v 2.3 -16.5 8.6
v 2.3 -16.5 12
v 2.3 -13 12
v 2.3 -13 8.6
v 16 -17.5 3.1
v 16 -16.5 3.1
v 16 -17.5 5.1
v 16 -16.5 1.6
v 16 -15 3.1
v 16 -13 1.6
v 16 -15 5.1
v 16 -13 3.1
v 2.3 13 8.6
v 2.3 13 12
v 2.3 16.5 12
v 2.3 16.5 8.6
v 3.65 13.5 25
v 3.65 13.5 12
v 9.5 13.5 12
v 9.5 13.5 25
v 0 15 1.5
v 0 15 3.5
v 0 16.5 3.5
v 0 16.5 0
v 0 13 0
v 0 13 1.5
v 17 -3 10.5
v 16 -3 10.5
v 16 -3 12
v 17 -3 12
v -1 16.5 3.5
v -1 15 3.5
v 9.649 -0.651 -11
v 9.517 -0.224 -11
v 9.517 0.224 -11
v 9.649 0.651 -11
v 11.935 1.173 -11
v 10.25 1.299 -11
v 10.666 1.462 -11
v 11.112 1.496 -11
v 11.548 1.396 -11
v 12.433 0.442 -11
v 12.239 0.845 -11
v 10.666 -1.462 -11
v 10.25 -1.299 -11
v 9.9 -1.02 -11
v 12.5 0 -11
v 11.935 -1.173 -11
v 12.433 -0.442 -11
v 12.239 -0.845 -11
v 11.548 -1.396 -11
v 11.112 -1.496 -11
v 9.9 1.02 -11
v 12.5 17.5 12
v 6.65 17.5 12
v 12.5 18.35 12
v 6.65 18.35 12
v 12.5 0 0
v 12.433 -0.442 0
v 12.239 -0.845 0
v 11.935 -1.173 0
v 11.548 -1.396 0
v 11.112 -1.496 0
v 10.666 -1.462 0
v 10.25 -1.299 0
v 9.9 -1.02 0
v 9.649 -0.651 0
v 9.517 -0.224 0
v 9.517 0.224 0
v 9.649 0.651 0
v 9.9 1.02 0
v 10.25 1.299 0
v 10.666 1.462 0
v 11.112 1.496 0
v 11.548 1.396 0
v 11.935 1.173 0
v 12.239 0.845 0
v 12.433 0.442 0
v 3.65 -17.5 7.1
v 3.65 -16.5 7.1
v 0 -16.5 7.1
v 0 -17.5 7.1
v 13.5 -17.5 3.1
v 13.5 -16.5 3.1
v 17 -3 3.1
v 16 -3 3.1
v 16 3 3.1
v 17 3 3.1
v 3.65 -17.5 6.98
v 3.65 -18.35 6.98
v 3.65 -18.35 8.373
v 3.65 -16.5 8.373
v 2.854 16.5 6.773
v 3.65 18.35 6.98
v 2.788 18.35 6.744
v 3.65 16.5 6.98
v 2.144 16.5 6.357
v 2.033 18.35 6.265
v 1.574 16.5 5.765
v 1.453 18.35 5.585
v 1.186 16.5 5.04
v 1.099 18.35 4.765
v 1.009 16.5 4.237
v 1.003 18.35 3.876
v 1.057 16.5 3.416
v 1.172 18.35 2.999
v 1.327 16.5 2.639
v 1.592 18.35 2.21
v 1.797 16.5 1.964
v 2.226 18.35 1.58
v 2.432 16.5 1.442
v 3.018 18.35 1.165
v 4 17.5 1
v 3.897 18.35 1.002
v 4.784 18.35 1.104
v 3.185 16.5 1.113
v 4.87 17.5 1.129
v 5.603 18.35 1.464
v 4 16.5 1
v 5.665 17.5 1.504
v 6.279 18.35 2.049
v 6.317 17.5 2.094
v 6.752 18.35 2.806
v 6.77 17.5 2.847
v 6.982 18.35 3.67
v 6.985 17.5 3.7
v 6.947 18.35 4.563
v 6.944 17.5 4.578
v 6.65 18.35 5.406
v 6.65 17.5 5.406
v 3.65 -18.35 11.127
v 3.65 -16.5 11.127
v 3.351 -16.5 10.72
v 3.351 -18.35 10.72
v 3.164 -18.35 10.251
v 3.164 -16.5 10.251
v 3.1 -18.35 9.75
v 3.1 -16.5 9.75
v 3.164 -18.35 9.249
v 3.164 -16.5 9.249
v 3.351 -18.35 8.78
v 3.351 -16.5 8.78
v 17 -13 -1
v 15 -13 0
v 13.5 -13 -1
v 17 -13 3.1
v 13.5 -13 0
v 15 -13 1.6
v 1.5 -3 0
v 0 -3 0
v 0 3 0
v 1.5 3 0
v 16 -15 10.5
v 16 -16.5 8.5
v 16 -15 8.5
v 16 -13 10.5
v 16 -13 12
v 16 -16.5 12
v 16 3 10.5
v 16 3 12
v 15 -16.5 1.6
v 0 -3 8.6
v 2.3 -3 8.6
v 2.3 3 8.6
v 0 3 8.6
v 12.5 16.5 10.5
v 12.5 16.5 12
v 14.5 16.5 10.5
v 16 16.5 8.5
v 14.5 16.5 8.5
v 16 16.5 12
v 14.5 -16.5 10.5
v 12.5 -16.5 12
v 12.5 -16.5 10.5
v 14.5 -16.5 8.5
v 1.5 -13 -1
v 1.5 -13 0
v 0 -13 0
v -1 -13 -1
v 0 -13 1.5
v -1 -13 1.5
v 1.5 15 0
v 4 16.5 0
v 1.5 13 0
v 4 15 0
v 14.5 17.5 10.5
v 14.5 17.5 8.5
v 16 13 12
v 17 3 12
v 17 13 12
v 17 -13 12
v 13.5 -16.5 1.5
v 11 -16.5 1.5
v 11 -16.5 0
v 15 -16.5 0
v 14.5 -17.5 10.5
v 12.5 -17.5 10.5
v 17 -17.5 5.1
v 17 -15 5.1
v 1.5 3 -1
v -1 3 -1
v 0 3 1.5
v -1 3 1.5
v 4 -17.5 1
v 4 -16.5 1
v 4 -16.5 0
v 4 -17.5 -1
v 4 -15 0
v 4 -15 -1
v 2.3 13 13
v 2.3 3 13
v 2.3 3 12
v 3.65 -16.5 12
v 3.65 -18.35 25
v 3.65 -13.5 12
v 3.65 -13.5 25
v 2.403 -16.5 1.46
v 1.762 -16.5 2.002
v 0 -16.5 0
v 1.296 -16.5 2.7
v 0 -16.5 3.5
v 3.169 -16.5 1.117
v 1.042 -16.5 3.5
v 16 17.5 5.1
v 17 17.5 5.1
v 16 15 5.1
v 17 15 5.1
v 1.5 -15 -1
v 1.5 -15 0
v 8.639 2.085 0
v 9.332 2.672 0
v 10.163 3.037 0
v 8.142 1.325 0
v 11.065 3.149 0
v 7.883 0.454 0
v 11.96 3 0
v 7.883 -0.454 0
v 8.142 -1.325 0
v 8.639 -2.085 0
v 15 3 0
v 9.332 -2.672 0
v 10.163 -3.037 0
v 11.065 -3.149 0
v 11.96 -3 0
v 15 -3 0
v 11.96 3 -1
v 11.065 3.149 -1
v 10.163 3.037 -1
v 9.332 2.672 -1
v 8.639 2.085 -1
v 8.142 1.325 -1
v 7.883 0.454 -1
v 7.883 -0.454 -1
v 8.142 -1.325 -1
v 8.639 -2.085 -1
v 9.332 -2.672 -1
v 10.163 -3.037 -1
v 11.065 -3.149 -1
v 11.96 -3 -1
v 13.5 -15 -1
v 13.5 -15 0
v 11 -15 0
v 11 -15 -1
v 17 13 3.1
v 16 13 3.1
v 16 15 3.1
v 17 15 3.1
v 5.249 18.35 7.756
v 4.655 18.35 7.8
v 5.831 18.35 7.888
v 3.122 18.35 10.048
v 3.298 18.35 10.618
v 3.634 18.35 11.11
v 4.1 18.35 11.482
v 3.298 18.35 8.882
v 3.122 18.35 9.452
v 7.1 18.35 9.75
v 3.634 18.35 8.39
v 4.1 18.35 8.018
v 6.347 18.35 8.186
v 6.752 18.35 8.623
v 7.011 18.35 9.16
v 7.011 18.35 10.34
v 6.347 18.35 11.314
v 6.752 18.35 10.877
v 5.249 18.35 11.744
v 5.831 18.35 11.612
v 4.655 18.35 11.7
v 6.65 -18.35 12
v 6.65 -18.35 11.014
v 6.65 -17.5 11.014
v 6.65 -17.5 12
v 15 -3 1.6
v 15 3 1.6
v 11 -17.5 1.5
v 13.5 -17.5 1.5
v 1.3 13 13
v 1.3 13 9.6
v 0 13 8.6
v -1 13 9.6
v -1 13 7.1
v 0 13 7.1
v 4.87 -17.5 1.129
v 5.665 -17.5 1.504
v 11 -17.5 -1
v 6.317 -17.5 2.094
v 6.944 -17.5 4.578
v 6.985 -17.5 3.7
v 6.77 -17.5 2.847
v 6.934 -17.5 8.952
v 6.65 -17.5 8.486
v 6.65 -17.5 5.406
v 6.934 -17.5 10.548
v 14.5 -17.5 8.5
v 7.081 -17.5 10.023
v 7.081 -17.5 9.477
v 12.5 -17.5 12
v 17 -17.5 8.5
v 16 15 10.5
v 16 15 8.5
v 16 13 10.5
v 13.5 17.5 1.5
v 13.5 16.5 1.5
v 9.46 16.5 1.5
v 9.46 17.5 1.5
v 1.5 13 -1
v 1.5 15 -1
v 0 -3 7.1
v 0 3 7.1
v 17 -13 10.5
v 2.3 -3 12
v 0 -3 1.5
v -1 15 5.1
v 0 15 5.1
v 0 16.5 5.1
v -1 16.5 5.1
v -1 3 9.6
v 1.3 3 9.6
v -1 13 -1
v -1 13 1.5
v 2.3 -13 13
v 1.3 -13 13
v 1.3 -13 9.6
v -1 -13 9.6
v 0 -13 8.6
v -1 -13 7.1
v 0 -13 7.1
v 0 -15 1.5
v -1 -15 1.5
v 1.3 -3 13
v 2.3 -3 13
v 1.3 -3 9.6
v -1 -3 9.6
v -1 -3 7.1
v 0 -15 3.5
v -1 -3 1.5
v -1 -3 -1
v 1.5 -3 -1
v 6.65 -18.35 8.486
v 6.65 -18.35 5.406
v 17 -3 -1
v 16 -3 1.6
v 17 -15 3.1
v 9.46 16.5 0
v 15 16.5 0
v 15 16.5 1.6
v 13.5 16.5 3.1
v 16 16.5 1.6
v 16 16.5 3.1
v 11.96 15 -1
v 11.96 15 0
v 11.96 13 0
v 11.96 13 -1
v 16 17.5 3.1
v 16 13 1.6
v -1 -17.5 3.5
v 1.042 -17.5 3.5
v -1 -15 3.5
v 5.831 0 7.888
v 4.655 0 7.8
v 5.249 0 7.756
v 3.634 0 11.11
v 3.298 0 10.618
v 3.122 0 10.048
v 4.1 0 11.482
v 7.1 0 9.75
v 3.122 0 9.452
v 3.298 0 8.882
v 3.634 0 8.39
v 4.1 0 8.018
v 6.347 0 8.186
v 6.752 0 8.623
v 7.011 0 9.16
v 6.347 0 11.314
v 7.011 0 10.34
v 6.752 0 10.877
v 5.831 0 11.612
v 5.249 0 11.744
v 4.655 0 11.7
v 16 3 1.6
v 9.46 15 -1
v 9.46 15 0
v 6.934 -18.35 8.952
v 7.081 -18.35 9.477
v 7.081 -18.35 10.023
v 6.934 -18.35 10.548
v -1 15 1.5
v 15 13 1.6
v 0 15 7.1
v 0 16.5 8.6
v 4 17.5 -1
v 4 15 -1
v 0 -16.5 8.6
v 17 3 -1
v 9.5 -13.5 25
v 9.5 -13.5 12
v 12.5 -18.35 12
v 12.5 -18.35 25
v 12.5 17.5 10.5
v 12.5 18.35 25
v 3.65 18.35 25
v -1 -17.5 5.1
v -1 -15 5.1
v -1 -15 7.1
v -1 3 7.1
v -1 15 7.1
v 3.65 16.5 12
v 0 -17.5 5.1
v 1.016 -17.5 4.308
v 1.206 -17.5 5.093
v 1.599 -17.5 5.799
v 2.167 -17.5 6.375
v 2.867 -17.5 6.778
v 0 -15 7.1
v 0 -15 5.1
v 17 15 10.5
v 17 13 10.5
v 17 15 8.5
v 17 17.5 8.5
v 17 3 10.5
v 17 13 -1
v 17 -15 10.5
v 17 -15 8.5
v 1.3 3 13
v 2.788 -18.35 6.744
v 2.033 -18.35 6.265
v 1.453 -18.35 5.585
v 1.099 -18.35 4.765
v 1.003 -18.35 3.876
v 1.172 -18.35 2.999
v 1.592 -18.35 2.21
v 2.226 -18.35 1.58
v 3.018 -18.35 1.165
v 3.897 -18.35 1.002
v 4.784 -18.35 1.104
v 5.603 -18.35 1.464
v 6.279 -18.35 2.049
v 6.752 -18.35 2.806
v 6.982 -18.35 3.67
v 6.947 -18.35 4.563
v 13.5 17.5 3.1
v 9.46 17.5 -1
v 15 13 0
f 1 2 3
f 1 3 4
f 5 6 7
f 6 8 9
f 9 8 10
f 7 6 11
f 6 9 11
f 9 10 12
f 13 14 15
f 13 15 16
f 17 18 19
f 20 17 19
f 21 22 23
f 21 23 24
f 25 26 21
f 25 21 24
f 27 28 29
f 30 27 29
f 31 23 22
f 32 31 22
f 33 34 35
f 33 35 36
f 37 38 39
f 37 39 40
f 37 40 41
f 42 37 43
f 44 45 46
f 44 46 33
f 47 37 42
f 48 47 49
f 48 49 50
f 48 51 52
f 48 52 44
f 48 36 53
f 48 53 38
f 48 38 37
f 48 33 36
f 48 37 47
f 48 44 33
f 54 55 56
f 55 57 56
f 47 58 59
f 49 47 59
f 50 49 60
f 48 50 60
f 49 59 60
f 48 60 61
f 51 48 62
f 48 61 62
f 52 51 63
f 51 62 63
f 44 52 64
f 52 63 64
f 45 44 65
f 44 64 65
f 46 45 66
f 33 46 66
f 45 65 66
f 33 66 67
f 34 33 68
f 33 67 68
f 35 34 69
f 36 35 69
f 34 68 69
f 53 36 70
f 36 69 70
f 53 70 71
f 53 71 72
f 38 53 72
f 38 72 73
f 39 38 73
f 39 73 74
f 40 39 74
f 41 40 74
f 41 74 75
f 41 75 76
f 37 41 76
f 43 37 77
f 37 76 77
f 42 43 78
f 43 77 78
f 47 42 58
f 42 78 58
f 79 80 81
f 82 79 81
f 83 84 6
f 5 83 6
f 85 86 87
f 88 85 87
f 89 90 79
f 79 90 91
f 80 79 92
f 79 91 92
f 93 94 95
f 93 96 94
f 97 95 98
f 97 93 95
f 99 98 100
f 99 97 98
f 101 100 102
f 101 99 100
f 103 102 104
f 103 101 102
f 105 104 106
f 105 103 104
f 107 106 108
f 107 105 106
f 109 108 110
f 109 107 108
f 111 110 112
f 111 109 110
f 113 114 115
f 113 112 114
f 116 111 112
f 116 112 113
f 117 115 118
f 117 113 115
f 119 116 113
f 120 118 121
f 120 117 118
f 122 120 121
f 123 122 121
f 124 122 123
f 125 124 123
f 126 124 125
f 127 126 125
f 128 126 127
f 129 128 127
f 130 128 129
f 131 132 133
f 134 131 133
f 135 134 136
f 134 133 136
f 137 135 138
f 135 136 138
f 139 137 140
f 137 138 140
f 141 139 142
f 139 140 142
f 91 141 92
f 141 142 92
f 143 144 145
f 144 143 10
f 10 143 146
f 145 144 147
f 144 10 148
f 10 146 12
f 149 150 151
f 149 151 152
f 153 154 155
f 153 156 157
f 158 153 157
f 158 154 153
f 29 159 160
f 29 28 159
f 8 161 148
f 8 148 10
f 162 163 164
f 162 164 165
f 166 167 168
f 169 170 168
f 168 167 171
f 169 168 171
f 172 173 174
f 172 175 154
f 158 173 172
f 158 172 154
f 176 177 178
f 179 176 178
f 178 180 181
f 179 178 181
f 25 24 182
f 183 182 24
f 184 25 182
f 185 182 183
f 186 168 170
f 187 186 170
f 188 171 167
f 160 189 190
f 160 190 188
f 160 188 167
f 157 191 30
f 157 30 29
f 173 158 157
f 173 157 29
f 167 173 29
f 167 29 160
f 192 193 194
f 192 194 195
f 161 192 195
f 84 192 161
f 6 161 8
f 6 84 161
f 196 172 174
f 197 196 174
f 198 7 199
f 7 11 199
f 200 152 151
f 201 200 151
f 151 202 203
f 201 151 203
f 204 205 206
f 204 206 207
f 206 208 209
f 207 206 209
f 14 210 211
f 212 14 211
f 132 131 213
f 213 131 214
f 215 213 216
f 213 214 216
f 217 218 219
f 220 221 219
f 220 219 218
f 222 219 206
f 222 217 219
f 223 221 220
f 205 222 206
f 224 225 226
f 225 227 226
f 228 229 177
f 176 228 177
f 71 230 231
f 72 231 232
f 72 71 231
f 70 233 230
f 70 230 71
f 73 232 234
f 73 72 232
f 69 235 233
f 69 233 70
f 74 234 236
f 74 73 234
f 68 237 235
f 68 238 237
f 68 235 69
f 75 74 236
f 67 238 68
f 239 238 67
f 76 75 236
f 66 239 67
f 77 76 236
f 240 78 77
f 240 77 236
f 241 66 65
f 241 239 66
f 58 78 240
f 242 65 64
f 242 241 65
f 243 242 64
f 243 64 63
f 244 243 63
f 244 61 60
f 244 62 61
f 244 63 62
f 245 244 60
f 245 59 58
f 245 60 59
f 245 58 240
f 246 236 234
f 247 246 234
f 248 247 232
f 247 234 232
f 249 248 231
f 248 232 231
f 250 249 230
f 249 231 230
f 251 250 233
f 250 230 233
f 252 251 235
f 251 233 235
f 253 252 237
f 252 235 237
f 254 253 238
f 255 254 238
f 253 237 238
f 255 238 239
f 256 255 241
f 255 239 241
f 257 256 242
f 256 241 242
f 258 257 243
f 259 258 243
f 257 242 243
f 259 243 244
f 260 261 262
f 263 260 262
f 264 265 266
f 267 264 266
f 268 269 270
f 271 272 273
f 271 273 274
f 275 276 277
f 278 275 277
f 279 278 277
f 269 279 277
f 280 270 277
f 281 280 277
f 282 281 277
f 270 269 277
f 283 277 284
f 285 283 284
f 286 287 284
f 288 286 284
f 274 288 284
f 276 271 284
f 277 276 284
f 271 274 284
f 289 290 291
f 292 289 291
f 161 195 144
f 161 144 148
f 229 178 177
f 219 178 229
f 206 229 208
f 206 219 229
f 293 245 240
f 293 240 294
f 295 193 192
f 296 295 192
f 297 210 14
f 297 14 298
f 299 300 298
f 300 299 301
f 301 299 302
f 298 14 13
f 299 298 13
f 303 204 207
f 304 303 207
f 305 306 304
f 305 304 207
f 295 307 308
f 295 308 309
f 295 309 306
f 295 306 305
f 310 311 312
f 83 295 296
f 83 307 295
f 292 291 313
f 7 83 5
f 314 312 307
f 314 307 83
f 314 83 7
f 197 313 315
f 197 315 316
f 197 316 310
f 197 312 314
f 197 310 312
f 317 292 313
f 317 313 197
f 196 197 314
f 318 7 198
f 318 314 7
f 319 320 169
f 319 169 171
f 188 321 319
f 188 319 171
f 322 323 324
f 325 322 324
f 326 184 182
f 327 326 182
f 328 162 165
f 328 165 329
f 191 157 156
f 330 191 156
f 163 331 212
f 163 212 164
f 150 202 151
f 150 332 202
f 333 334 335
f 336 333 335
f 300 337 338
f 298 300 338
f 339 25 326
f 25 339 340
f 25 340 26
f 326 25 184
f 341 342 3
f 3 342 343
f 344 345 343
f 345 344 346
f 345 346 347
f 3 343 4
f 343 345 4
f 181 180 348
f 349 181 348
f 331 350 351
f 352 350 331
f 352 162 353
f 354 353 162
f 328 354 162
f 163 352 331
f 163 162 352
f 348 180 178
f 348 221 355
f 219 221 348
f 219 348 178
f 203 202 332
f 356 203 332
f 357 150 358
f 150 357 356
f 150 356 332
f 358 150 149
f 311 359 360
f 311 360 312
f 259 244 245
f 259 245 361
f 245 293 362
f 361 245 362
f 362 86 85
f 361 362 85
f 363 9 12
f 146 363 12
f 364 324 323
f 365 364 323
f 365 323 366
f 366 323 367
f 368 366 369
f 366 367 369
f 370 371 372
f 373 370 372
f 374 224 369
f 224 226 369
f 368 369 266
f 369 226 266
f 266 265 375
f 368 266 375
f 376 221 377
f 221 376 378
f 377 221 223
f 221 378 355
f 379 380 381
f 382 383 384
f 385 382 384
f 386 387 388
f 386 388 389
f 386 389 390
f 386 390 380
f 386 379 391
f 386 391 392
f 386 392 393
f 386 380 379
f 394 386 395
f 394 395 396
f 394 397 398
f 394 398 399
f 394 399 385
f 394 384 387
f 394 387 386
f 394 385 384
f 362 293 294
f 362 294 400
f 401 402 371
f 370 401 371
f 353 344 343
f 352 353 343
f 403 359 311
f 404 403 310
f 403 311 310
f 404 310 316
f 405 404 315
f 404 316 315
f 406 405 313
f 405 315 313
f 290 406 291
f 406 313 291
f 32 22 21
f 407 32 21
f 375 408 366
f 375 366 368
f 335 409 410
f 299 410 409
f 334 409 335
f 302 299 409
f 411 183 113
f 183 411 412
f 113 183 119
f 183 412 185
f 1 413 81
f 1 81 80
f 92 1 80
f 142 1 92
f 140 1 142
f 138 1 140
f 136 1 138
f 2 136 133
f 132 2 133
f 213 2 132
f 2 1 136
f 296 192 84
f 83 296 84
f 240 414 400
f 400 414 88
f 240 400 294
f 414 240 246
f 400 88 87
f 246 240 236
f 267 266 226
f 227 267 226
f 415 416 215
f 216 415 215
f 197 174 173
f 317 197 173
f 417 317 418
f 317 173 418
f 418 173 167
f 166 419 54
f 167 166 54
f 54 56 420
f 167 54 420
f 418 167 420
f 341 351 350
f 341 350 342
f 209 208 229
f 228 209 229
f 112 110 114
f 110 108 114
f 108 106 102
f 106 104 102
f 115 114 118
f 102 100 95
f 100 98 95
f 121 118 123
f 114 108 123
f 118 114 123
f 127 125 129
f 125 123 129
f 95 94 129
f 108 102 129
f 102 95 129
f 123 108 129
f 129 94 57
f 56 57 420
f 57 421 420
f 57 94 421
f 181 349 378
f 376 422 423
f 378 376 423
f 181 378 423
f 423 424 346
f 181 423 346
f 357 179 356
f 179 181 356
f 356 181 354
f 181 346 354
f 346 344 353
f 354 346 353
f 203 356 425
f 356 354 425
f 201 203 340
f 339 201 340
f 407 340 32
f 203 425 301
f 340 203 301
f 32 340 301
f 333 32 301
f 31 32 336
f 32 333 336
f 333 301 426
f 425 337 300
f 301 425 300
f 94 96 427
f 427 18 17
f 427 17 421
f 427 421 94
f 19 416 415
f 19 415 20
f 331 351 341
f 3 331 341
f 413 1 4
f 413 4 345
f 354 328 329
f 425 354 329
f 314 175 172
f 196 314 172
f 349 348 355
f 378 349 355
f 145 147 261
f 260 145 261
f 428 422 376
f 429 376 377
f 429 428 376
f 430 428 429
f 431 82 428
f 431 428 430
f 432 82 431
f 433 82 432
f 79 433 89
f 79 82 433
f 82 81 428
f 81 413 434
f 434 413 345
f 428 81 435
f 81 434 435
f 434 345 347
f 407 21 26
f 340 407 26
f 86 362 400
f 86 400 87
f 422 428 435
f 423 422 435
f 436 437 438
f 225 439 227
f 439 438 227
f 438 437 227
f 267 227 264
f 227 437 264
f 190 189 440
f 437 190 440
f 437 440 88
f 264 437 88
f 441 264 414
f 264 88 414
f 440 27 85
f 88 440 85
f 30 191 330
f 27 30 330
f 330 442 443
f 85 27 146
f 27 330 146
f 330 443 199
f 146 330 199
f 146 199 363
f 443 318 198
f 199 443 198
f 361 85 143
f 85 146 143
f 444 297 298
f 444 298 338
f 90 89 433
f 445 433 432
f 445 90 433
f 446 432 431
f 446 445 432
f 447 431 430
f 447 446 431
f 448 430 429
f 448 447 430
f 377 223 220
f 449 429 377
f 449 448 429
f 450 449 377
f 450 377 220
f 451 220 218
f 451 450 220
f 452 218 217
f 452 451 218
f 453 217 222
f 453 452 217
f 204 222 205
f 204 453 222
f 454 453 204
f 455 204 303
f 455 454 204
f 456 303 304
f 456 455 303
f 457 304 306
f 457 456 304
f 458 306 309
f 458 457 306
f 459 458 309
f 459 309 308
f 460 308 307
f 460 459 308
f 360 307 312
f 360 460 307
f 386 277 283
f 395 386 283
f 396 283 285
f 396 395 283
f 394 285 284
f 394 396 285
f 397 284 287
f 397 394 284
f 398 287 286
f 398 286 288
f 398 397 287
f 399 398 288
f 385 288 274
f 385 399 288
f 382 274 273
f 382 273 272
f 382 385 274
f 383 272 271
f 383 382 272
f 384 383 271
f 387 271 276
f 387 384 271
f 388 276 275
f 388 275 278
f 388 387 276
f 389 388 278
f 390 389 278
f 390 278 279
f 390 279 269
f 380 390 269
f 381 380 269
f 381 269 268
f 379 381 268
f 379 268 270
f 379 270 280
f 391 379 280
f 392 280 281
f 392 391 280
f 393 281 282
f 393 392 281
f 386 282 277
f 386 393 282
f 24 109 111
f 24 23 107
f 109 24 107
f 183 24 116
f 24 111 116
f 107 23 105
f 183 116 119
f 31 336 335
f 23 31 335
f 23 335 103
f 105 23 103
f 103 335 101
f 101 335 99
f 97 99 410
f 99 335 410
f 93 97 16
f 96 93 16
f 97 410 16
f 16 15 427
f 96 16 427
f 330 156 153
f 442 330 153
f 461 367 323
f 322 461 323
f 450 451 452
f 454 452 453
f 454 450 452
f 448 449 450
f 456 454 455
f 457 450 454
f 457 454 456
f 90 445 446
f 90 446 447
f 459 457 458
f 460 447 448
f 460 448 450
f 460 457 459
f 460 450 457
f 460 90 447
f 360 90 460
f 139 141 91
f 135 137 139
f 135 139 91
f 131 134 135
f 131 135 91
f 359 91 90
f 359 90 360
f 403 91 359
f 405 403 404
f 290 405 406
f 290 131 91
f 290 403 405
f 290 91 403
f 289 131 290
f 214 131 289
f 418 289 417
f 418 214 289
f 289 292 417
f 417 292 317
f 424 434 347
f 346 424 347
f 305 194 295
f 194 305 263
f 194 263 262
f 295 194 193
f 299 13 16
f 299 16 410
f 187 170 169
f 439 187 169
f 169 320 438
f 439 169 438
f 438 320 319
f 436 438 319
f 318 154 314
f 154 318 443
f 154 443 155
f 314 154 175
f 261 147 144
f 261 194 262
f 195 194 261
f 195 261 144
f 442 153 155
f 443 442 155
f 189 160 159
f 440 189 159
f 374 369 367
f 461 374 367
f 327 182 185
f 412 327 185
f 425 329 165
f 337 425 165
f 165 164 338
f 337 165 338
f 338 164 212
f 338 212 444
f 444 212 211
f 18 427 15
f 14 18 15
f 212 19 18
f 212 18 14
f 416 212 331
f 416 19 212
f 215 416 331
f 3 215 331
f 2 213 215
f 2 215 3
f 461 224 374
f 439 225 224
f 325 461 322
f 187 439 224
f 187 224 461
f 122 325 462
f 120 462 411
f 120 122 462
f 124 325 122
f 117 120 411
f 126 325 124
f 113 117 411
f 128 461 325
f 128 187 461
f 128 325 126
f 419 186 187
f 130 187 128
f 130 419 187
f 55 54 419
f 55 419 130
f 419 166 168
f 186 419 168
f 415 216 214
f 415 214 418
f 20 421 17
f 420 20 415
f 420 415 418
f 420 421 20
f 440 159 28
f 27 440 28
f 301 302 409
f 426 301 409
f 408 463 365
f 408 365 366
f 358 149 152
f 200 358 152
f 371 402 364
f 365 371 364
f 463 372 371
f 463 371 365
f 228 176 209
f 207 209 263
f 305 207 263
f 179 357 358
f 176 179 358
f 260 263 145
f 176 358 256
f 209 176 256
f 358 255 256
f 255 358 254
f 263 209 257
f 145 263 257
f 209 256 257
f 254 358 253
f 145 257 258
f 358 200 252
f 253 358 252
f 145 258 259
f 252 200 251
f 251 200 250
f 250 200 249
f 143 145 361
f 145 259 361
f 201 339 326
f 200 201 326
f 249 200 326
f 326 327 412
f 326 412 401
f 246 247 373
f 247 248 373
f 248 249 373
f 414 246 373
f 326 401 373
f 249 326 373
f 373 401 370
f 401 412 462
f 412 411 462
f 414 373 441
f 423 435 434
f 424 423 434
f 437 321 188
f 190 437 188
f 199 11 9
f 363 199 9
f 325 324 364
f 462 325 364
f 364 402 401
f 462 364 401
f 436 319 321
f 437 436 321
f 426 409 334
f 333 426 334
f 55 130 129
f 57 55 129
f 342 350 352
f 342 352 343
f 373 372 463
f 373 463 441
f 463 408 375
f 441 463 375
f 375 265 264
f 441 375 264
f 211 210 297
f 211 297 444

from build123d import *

# Parameters (mm, degrees)
F0_R          = 3
F0_R_2        = 2
F1_DEPTH      = 16.5
F1_DEPTH_BACK = 16.5
F3_DEPTH      = 18.35
F4_DEPTH      = 11
F5_DEPTH      = 18.35
F6_DEPTH      = 18.35
F7_START      = -12
F2_W          = 3
F2_H          = 1.85
F7_DEPTH      = 13
F9_DEPTH      = 1
F11_DEPTH     = 1
F12_W         = 3
F12_H         = 1.85
F12_W_2       = 2.85
F12_W_3       = 4.2
F12_H_2       = 1.5
F13_DEPTH     = 13
F14_DEPTH     = 13
F15_DEPTH     = 8
F16_DEPTH     = 8
F17_W         = 3.3
F17_H         = 10
F18_DEPTH     = 1
F19_W         = 10
F19_H         = 4.4
F20_DEPTH     = 1
F22_DEPTH     = 1.6
F24_DEPTH     = 1
F26_DEPTH     = 1
F28_DEPTH     = 1


with BuildPart() as f1:
    # F0 (on Front) → F1 (new body, two sides)
    with BuildSketch(Plane.XZ) as f1_sk:
        Polygon((0, 8.6), (0, 0), (15, 0), (15, 1.6), (16, 1.6), (16, 12), (2.3, 12), (2.3, 8.6), align=None)
        with Locations((4, 4)):
            Circle(F0_R, mode=Mode.SUBTRACT)
        with Locations((5.1, 9.75)):
            Circle(F0_R_2, mode=Mode.SUBTRACT)
        with Locations((4, 4)):
            Circle(F0_R)
        with Locations((5.1, 9.75)):
            Circle(F0_R_2)
    extrude(amount=F1_DEPTH)
    extrude(f1_sk.sketch, amount=-F1_DEPTH_BACK)

    # F0 (on Front) → F3 (join, symmetric)
    with BuildSketch(Plane.XZ):
        with Locations((4, 4)):
            Circle(F0_R)
    extrude(amount=F3_DEPTH, both=True)

    # F2 (on face) → F4 (join)
    with BuildSketch(Plane(origin=(0, 0, 0), x_dir=(1, 0, 0), z_dir=(0, 0, -1))):
        with BuildLine():
            ThreePointArc((9.5, 0), (11, -1.5), (12.5, 0))
            ThreePointArc((12.5, 0), (11, 1.5), (9.5, 0))
        make_face()
    extrude(amount=F4_DEPTH)

    # F0 (on Front) → F5 (join)
    with BuildSketch(Plane.XZ):
        with Locations((5.1, 9.75)):
            Circle(F0_R_2)
    extrude(amount=F5_DEPTH)

    # F2 (on face) → F7 (join)
    with BuildSketch(Plane(origin=(0, 0, 0), x_dir=(1, 0, 0), z_dir=(0, 0, -1)).offset(F7_START)):
        with Locations((11, 17.425)):
            Rectangle(F2_W, F2_H)
        with BuildLine():
            ThreePointArc((9.5, 2), (11, 2.5), (12.5, 2))
            Line((12.5, 2), (12.5, 16.5))
            Line((12.5, 16.5), (9.5, 16.5))
            Line((9.5, 16.5), (9.5, 2))
        make_face()
        with BuildLine():
            Line((12.5, 0), (12.5, 2))
            ThreePointArc((12.5, 2), (11, 2.5), (9.5, 2))
            Line((9.5, 2), (9.5, 0))
            ThreePointArc((9.5, 0), (11, 1.5), (12.5, 0))
        make_face()
        with BuildLine():
            ThreePointArc((9.5, 0), (11, -1.5), (12.5, 0))
            ThreePointArc((12.5, 0), (11, 1.5), (9.5, 0))
        make_face()
        with BuildLine():
            ThreePointArc((9.5, -2), (11, -2.5), (12.5, -2))
            Line((12.5, -2), (12.5, 0))
            ThreePointArc((12.5, 0), (11, -1.5), (9.5, 0))
            Line((9.5, 0), (9.5, -2))
        make_face()
        with BuildLine():
            Line((12.5, -16.5), (12.5, -2))
            ThreePointArc((12.5, -2), (11, -2.5), (9.5, -2))
            Line((9.5, -2), (9.5, -16.5))
            Line((9.5, -16.5), (12.5, -16.5))
        make_face()
        with Locations((11, -17.425)):
            Rectangle(F2_W, F2_H)
    extrude(amount=-F7_DEPTH)

    # F8 (on face) → F9 (join)
    with BuildSketch(Plane.YZ.offset(16)):
        Polygon((-13, 3.1), (-13, 1.6), (-3, 1.6), (-3, 3.1), (3, 3.1), (3, 1.6), (13, 1.6), (13, 3.1), (15, 3.1), (15, 5.1), (16.5, 5.1), (16.5, 8.5), (15, 8.5), (15, 10.5), (13, 10.5), (13, 12), (3, 12), (3, 10.5), (-3, 10.5), (-3, 12), (-13, 12), (-13, 10.5), (-15, 10.5), (-15, 8.5), (-16.5, 8.5), (-16.5, 5.1), (-15, 5.1), (-15, 3.1), align=None)
    extrude(amount=F9_DEPTH)

    # F10 (on face) → F11 (join)
    with BuildSketch(Plane(origin=(0, 0, 0), x_dir=(0, -1, 0), z_dir=(-1, 0, 0))):
        Polygon((-13, 1.5), (-13, 0), (-3, 0), (-3, 1.5), (3, 1.5), (3, 0), (13, 0), (13, 1.5), (15, 1.5), (15, 3.5), (16.5, 3.5), (16.5, 5.1), (15, 5.1), (15, 7.1), (13, 7.1), (13, 8.6), (3, 8.6), (3, 7.1), (-3, 7.1), (-3, 8.6), (-13, 8.6), (-13, 7.1), (-15, 7.1), (-15, 5.1), (-16.5, 5.1), (-16.5, 3.5), (-15, 3.5), (-15, 1.5), align=None)
    extrude(amount=F11_DEPTH)

    # F12 (on face) → F13 (join, through all)
    with BuildSketch(Plane.XY.offset(12)):
        with Locations((5.15, -17.425)):
            Rectangle(F12_W, F12_H)
        Polygon((6.65, -16.5), (9.5, -16.5), (9.5, -13.5), (8, -13.5), (8, -15), (3.8, -15), (3.8, -13.5), (3.65, -13.5), (3.65, -16.5), align=None)
        with Locations((8.075, -17.425)):
            Rectangle(F12_W_2, F12_H)
        with Locations((5.9, -14.25)):
            Rectangle(F12_W_3, F12_H_2)
    extrude(amount=F13_DEPTH)

    # F12 (on face) → F14 (join, through all)
    with BuildSketch(Plane.XY.offset(12)):
        with Locations((8.075, 17.425)):
            Rectangle(F12_W_2, F12_H)
        with Locations((5.15, 17.425)):
            Rectangle(F12_W, F12_H)
        Polygon((8, 13.5), (9.5, 13.5), (9.5, 16.5), (6.65, 16.5), (3.65, 16.5), (3.65, 13.5), (3.8, 13.5), (3.8, 15), (8, 15), align=None)
        with Locations((5.9, 14.25)):
            Rectangle(F12_W_3, F12_H_2)
    extrude(amount=F14_DEPTH)

    # F12 (on face) → F15 (join)
    with BuildSketch(Plane.XY.offset(12)):
        with Locations((5.15, -17.425)):
            Rectangle(F12_W, F12_H)
    extrude(amount=-F15_DEPTH)

    # F12 (on face) → F16 (join)
    with BuildSketch(Plane.XY.offset(12)):
        with Locations((5.15, 17.425)):
            Rectangle(F12_W, F12_H)
    extrude(amount=-F16_DEPTH)

    # F17 (on face) → F18 (join)
    with BuildSketch(Plane.XY.offset(8.6)):
        with Locations((0.65, -8)):
            Rectangle(F17_W, F17_H)
        with Locations((0.65, 8)):
            Rectangle(F17_W, F17_H)
    extrude(amount=F18_DEPTH)

    # F19 (on face) → F20 (join)
    with BuildSketch(Plane(origin=(2.3, 0, 0), x_dir=(0, -1, 0), z_dir=(-1, 0, 0))):
        with Locations((8, 10.8)):
            Rectangle(F19_W, F19_H)
        with Locations((-8, 10.8)):
            Rectangle(F19_W, F19_H)
    extrude(amount=F20_DEPTH)

    # F21 (on face) → F22 (join, through all)
    with BuildSketch(Plane(origin=(0, 0, 1.6), x_dir=(1, 0, 0), z_dir=(0, 0, -1))):
        Polygon((16, 13), (15, 13), (15, 3), (16, 3), (17, 3), (17, 13), align=None)
        Polygon((16, -3), (15, -3), (15, -13), (16, -13), (17, -13), (17, -3), align=None)
    extrude(amount=F22_DEPTH)

    # F23 (on face) → F24 (join)
    with BuildSketch(Plane(origin=(0, 0, 0), x_dir=(1, 0, 0), z_dir=(0, 0, -1))):
        with BuildLine():
            Line((15, -13), (17, -13))
            Line((17, -13), (17, -3))
            Line((17, -3), (15, -3))
            Line((15, -3), (11.9604686356, -3))
            ThreePointArc((11.9604686356, -3), (7.85, 0), (11.9604686356, 3))
            Line((11.9604686356, 3), (15, 3))
            Line((15, 3), (17, 3))
            Line((17, 3), (17, 13))
            Line((17, 13), (15, 13))
            Line((15, 13), (13.5, 13))
            Line((13.5, 13), (13.5, 15))
            Line((13.5, 15), (11, 15))
            Line((11, 15), (11, 16.5))
            Line((11, 16.5), (4, 16.5))
            Line((4, 16.5), (4, 15))
            Line((4, 15), (1.5, 15))
            Line((1.5, 15), (1.5, 13))
            Line((1.5, 13), (0, 13))
            Line((0, 13), (-1, 13))
            Line((-1, 13), (-1, 3))
            Line((-1, 3), (0, 3))
            Line((0, 3), (1.5, 3))
            Line((1.5, 3), (1.5, -3))
            Line((1.5, -3), (0, -3))
            Line((0, -3), (-1, -3))
            Line((-1, -3), (-1, -13))
            Line((-1, -13), (0, -13))
            Line((0, -13), (1.5, -13))
            Line((1.5, -13), (1.5, -15))
            Line((1.5, -15), (4, -15))
            Line((4, -15), (4, -16.5))
            Line((4, -16.5), (9.4604686356, -16.5))
            Line((9.4604686356, -16.5), (9.4604686356, -15))
            Line((9.4604686356, -15), (11.9604686356, -15))
            Line((11.9604686356, -15), (11.9604686356, -13))
            Line((11.9604686356, -13), (15, -13))
        make_face()
    extrude(amount=F24_DEPTH)

    # F25 (on face) → F26 (join)
    with BuildSketch(Plane(origin=(0, 16.5, 0), x_dir=(-1, 0, 0), z_dir=(0, 1, 0))):
        with BuildLine():
            Line((-12.5, 10.5), (-14.5, 10.5))
            Line((-14.5, 10.5), (-14.5, 8.5))
            Line((-14.5, 8.5), (-16, 8.5))
            Line((-16, 8.5), (-17, 8.5))
            Line((-17, 8.5), (-17, 5.1))
            Line((-17, 5.1), (-16, 5.1))
            Line((-16, 5.1), (-16, 3.1))
            Line((-16, 3.1), (-13.5, 3.1))
            Line((-13.5, 3.1), (-13.5, 1.5))
            Line((-13.5, 1.5), (-9.4604686356, 1.5))
            Line((-9.4604686356, 1.5), (-9.4604686356, 0))
            Line((-9.4604686356, 0), (-9.4604686356, -1))
            Line((-9.4604686356, -1), (-4, -1))
            Line((-4, -1), (-4, 0))
            Line((-4, 0), (-4, 1))
            ThreePointArc((-4, 1), (-6.5708664233, 2.4538286533), (-6.65, 5.406236111))
            Line((-6.65, 5.406236111), (-6.65, 12))
            Line((-6.65, 12), (-12.5, 12))
            Line((-12.5, 12), (-12.5, 10.5))
        make_face()
    extrude(amount=F26_DEPTH)

    # F27 (on face) → F28 (join)
    with BuildSketch(Plane.XZ.offset(16.5)):
        with BuildLine():
            Line((4, 0), (4, -1))
            Line((4, -1), (11, -1))
            Line((11, -1), (11, 0))
            Line((11, 0), (11, 1.5))
            Line((11, 1.5), (13.5, 1.5))
            Line((13.5, 1.5), (13.5, 3.1))
            Line((13.5, 3.1), (16, 3.1))
            Line((16, 3.1), (16, 5.1))
            Line((16, 5.1), (17, 5.1))
            Line((17, 5.1), (17, 8.5))
            Line((17, 8.5), (16, 8.5))
            Line((16, 8.5), (14.5, 8.5))
            Line((14.5, 8.5), (14.5, 10.5))
            Line((14.5, 10.5), (12.5, 10.5))
            Line((12.5, 10.5), (12.5, 12))
            Line((12.5, 12), (6.65, 12))
            Line((6.65, 12), (6.65, 11.013922466))
            ThreePointArc((6.65, 11.013922466), (7.1, 9.75), (6.65, 8.486077534))
            Line((6.65, 8.486077534), (6.65, 5.406236111))
            ThreePointArc((6.65, 5.406236111), (6.5708664233, 2.4538286533), (4, 1))
            Line((4, 1), (4, 0))
        make_face()
        with BuildLine():
            Line((-1, 3.5), (0, 3.5))
            Line((0, 3.5), (1.0419601085, 3.5))
            ThreePointArc((1.0419601085, 3.5), (1.599471865, 5.7992956047), (3.65, 6.9795133831))
            Line((3.65, 6.9795133831), (3.65, 7.1))
            Line((3.65, 7.1), (0, 7.1))
            Line((0, 7.1), (0, 5.1))
            Line((0, 5.1), (-1, 5.1))
            Line((-1, 5.1), (-1, 3.5))
        make_face()
    extrude(amount=F28_DEPTH)


with BuildPart() as f6:
    # F0 (on Front) → F6 (new body)
    with BuildSketch(Plane.XZ):
        with Locations((5.1, 9.75)):
            Circle(F0_R_2)
    extrude(amount=-F6_DEPTH)


solid = Compound([f1.part, f6.part])
